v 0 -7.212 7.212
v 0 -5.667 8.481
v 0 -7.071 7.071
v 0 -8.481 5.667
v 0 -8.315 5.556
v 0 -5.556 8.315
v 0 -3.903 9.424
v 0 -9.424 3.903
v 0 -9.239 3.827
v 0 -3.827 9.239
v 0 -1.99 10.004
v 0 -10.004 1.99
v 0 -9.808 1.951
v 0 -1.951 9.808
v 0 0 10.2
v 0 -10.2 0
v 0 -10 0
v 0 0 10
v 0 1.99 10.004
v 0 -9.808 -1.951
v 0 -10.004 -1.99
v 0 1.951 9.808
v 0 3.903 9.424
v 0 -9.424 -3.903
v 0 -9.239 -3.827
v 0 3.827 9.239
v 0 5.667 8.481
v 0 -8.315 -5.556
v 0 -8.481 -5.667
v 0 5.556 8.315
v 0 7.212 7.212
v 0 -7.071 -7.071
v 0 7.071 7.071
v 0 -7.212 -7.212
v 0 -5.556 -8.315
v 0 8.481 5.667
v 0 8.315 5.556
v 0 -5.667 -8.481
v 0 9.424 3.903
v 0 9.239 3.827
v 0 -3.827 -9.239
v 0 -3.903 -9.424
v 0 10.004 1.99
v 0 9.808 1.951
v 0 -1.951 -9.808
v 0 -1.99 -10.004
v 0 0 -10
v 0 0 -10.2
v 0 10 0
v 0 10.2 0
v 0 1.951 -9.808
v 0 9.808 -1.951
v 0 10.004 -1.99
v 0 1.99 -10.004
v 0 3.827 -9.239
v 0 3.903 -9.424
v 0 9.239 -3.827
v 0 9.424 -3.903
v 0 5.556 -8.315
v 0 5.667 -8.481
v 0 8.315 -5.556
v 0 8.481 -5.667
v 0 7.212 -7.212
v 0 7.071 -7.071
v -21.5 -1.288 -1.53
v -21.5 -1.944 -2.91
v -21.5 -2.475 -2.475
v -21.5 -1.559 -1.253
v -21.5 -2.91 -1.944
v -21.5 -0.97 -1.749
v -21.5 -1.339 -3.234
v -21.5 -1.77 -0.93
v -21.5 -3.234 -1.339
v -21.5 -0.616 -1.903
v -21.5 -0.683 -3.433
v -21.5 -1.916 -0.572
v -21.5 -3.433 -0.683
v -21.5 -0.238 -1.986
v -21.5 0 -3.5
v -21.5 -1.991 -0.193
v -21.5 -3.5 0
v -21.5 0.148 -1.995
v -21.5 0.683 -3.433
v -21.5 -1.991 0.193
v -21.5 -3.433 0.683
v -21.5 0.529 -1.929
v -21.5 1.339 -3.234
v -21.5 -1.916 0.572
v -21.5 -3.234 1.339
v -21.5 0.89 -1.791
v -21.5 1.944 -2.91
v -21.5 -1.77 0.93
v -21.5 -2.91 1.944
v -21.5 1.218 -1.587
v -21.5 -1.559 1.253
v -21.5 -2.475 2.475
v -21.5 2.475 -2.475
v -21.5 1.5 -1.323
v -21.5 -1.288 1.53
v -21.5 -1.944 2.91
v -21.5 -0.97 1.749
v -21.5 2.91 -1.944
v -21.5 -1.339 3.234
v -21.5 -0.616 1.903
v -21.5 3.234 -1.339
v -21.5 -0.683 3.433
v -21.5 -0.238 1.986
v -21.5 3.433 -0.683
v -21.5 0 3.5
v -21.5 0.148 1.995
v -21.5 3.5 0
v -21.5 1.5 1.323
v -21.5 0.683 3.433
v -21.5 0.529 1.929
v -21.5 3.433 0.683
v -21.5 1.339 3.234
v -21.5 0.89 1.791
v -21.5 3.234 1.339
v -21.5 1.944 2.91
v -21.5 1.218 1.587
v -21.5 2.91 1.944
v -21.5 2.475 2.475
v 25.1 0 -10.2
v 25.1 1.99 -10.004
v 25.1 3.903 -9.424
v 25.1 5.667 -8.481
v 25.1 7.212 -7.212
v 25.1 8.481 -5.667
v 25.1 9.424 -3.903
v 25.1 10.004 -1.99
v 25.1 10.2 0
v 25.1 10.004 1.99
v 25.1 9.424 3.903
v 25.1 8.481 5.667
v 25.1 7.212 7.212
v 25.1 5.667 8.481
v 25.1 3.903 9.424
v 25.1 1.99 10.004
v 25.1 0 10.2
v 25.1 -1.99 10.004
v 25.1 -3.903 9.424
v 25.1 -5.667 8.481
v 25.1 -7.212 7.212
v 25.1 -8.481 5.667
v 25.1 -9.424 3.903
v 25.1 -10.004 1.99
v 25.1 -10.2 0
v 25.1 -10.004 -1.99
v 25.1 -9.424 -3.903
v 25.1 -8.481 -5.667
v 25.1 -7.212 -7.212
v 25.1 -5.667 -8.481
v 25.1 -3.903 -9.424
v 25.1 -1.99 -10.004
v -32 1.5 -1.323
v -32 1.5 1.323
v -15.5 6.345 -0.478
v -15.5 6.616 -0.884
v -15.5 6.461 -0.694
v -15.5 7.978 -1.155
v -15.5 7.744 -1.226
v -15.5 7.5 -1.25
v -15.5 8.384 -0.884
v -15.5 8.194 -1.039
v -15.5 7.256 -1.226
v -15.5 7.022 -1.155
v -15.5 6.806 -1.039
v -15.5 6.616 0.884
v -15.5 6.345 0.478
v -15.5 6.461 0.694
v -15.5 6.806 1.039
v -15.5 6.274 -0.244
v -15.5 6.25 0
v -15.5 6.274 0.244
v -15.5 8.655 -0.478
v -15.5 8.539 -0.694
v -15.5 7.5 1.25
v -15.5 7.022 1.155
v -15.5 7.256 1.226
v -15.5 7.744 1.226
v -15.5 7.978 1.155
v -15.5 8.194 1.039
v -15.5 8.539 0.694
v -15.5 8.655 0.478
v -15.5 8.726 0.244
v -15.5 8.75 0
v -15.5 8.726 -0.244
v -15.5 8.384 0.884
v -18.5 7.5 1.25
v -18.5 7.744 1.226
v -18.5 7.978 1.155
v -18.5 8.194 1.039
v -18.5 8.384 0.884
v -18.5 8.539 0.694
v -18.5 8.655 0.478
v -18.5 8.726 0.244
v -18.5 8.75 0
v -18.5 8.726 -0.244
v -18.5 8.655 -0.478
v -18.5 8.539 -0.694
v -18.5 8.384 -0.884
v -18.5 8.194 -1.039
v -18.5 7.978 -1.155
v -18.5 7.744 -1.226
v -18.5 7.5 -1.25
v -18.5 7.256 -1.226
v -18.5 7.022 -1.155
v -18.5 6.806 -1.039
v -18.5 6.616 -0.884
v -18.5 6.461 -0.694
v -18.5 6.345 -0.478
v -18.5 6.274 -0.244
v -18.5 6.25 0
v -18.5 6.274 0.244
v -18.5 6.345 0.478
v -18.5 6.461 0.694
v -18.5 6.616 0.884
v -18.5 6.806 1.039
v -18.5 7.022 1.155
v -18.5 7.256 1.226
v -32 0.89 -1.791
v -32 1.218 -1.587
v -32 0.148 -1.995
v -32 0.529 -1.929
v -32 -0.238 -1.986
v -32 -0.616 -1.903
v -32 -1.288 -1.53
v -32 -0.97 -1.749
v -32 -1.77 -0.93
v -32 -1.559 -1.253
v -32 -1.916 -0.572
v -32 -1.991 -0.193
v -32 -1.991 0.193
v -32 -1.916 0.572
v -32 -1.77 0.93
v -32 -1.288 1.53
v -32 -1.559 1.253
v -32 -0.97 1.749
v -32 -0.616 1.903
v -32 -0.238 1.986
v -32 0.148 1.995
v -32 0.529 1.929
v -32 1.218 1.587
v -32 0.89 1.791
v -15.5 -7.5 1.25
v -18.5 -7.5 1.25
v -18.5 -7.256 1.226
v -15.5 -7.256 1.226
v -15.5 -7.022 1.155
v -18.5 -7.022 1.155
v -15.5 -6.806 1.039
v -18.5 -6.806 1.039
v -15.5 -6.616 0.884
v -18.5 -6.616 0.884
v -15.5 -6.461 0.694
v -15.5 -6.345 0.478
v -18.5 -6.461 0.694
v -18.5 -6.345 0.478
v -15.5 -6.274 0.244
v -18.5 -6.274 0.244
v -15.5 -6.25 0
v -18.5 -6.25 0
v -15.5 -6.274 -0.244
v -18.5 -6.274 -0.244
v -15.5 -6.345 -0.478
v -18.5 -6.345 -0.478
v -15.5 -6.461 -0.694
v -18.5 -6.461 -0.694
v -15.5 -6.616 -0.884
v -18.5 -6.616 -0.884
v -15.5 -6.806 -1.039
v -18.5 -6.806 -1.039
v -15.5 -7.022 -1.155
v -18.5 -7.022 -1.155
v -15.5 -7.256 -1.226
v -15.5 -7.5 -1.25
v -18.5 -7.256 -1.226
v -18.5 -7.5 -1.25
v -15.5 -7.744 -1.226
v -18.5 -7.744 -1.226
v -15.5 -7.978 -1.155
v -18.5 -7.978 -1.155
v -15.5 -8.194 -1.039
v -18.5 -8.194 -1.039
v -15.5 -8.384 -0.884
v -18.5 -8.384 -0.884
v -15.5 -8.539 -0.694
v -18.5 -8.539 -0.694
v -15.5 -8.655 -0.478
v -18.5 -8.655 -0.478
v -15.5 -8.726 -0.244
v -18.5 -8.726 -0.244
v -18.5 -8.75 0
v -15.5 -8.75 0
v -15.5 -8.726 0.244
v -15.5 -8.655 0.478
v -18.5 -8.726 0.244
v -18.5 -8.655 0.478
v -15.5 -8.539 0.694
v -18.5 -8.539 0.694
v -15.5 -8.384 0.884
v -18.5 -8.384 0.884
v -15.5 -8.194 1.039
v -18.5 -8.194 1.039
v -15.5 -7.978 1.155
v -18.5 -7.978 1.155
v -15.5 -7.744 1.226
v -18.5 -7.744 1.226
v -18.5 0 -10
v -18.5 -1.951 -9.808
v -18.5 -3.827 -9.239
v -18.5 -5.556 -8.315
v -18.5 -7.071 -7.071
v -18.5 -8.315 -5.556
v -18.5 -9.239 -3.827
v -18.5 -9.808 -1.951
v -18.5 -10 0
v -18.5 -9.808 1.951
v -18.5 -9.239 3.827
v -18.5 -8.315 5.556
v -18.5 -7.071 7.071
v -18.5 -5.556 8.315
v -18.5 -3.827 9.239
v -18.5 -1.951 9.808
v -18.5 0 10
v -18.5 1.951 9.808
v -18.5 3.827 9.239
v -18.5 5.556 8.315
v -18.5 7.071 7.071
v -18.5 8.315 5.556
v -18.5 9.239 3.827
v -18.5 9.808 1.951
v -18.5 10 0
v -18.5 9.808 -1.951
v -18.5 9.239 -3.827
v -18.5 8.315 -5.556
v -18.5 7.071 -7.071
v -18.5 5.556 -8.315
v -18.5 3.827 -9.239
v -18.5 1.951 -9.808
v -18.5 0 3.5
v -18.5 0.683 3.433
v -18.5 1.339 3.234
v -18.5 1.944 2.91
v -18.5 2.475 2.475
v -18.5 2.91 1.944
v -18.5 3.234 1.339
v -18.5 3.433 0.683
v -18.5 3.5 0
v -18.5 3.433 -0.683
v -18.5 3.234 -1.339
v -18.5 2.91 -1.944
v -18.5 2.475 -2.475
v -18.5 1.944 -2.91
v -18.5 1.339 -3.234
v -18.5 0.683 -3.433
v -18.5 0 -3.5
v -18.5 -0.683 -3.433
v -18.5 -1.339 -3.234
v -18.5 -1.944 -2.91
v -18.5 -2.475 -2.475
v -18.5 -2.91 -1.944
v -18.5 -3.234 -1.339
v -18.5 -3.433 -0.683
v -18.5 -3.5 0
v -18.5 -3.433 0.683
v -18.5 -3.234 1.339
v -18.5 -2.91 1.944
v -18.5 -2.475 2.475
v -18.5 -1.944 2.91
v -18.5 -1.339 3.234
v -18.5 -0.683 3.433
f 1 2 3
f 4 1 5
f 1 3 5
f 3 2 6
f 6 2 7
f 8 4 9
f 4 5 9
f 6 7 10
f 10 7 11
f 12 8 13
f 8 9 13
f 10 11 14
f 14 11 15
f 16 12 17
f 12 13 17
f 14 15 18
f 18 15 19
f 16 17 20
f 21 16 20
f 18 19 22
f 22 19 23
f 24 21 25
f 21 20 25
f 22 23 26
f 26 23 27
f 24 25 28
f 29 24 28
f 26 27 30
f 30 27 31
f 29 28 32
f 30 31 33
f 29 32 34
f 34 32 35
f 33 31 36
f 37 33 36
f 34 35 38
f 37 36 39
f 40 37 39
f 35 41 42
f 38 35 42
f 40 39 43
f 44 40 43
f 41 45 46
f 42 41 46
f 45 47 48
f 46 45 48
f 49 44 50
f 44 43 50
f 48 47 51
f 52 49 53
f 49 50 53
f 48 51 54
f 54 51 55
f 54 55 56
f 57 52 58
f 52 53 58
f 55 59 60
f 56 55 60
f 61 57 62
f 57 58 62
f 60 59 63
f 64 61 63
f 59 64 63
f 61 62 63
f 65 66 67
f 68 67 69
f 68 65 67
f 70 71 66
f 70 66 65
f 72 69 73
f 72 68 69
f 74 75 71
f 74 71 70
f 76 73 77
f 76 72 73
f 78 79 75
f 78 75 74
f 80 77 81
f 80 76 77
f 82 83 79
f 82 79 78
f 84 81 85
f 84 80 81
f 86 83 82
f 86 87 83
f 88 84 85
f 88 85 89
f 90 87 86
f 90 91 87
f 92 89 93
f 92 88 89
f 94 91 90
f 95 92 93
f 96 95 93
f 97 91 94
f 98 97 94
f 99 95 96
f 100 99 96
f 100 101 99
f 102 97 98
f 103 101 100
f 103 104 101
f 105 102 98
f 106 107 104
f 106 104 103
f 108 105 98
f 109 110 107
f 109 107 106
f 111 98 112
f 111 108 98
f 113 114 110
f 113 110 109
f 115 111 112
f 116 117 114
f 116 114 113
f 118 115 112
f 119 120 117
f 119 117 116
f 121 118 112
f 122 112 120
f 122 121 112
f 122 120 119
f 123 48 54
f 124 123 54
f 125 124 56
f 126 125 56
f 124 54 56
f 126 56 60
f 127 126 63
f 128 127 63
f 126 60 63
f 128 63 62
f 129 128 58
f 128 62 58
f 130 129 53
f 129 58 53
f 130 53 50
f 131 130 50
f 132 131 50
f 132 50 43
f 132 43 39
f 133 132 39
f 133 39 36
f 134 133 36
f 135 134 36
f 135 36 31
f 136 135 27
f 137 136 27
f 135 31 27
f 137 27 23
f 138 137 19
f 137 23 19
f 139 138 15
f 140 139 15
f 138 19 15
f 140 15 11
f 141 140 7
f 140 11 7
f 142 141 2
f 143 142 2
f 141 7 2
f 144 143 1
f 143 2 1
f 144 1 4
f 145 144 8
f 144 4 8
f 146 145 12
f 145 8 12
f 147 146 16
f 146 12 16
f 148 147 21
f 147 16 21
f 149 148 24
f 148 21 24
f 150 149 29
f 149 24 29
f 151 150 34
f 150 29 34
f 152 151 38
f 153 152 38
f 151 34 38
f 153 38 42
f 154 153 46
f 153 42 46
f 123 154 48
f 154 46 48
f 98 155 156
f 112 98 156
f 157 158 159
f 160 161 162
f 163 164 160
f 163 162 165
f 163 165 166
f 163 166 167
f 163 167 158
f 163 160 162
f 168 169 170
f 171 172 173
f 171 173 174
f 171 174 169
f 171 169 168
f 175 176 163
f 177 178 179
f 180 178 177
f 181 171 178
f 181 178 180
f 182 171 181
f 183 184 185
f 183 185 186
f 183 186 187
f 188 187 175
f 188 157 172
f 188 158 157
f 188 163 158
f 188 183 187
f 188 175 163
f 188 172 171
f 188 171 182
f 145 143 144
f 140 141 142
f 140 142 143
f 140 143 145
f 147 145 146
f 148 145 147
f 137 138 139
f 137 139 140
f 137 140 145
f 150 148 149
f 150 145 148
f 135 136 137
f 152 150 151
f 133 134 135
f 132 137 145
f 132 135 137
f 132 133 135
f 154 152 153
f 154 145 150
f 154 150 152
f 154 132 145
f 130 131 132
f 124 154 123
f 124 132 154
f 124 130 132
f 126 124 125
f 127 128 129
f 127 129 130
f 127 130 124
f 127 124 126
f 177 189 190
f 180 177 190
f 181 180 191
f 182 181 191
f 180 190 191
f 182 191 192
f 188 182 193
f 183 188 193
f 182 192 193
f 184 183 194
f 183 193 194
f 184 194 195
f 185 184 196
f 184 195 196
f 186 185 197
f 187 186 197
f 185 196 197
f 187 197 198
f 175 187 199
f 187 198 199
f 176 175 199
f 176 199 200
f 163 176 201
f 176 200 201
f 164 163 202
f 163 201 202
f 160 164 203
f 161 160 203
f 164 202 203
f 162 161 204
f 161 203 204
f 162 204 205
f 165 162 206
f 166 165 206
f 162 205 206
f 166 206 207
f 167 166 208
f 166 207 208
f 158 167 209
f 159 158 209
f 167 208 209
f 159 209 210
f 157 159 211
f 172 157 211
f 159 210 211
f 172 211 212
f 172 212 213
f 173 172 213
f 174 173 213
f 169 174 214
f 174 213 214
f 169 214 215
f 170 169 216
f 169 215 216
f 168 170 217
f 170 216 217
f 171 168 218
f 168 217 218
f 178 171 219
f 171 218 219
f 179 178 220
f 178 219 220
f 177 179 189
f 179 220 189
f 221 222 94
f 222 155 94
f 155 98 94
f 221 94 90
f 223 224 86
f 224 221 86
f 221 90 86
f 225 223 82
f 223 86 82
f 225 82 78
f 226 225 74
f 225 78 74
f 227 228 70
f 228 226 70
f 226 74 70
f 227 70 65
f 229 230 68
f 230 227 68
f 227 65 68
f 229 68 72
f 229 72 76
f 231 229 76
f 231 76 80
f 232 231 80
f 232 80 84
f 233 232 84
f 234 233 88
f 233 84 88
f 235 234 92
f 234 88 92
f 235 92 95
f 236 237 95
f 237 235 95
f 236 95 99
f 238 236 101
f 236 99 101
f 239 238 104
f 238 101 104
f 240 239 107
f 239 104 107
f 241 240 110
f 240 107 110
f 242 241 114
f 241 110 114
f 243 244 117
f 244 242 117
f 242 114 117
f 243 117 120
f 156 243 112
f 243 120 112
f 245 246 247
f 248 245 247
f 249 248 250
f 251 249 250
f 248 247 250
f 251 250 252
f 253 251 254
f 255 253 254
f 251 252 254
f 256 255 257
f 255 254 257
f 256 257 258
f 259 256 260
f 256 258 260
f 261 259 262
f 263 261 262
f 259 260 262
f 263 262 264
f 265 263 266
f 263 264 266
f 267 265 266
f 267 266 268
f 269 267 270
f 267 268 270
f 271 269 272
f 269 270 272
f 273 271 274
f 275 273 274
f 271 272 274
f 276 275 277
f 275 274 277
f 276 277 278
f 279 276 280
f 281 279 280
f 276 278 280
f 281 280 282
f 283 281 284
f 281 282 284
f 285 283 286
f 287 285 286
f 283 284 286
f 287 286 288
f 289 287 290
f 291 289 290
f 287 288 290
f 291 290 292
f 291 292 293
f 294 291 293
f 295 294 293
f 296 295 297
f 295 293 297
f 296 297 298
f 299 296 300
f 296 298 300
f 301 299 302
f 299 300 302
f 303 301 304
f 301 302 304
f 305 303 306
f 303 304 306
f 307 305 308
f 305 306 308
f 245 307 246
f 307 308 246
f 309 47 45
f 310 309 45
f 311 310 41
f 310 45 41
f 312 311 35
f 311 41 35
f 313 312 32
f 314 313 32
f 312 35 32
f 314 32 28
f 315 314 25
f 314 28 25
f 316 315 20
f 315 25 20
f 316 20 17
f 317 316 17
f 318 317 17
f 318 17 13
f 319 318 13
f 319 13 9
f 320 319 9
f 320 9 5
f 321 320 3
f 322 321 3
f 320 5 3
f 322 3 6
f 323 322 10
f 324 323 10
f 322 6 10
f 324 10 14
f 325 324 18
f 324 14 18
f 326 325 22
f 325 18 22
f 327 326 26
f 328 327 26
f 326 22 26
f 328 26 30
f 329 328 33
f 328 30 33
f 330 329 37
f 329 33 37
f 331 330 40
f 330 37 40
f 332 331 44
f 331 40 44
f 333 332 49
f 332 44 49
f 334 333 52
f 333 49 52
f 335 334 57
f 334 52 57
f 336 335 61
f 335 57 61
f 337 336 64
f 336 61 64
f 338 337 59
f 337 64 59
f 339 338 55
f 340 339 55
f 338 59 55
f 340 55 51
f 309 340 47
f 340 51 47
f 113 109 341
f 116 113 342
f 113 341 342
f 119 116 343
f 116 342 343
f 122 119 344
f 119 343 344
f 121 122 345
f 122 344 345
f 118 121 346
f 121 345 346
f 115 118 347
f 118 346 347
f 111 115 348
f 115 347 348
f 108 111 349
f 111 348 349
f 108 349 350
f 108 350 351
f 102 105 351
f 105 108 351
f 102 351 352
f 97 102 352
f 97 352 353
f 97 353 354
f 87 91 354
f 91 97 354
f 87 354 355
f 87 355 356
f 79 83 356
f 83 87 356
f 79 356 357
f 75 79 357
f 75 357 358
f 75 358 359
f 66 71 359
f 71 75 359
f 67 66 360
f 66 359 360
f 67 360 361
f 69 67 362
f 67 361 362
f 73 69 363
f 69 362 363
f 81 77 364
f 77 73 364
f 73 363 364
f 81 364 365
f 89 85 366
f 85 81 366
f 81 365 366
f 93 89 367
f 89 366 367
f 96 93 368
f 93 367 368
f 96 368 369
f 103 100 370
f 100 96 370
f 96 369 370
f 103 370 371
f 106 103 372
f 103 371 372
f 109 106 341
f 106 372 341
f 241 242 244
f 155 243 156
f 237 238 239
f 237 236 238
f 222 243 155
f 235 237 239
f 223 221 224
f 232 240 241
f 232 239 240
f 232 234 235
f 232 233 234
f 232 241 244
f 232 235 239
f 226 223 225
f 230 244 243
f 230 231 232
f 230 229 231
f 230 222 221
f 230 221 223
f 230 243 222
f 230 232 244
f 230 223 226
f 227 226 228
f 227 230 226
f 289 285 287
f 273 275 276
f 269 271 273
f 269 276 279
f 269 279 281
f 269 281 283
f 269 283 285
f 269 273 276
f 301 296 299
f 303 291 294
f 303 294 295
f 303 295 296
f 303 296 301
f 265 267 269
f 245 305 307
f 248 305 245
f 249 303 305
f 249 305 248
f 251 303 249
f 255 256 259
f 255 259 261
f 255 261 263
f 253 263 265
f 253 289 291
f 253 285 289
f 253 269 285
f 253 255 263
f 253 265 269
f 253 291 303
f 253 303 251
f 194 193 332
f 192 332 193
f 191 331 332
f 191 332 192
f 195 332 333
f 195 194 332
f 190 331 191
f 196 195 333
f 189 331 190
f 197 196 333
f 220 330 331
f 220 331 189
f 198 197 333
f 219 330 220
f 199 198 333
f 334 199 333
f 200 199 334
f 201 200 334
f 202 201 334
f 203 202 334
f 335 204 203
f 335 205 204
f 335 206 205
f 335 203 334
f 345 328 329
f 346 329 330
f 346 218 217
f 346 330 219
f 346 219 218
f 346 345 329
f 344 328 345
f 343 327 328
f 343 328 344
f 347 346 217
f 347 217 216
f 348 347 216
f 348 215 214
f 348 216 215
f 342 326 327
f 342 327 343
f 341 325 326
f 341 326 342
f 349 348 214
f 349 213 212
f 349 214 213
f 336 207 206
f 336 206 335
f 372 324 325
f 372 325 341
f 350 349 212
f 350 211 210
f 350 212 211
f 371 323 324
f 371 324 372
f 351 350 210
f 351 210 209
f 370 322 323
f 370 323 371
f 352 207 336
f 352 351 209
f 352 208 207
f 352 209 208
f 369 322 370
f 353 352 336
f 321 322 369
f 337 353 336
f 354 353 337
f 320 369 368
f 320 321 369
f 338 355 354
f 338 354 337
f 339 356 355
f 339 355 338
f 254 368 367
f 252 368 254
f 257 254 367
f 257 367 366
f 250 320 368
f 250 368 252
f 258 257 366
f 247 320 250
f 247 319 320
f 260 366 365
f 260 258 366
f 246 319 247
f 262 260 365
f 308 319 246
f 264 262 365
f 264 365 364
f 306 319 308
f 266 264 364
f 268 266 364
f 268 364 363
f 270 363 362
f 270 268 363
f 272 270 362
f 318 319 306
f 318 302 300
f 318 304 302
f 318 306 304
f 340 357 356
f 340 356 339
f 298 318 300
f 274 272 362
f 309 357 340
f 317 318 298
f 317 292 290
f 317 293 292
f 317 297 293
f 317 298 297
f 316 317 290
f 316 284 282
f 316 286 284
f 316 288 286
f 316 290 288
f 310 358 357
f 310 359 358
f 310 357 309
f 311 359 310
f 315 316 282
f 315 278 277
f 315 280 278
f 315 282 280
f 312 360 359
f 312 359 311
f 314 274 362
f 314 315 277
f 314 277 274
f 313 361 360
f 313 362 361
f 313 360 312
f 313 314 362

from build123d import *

# Parameters (mm, degrees)
SKETCH1_R           = 10.2
BOSS_EXTRUDE1_DEPTH = 25.1
SKETCH2_R           = 10
BOSS_EXTRUDE2_DEPTH = 18.5
SKETCH3_R           = 3.5
BOSS_EXTRUDE3_DEPTH = 3
SKETCH4_R           = 2
BOSS_EXTRUDE4_DEPTH = 10.5
CUT_EXTRUDE1_DEPTH  = 10.5
SKETCH6_R           = 1.25
CUT_EXTRUDE2_DEPTH  = 3


with BuildPart() as part:
    # Sketch1 → Boss-Extrude1 (new body)
    with BuildSketch(Plane(origin=(0, 0, 0), x_dir=(0, 0, -1), z_dir=(1, 0, 0))):
        Circle(SKETCH1_R)
    extrude(amount=BOSS_EXTRUDE1_DEPTH)

    # Sketch2 → Boss-Extrude2 (add)
    with BuildSketch(Plane.ZY):
        with Locations(Location((0, 0, 0), (0, 0, 180))):
            Circle(SKETCH2_R)
    extrude(amount=BOSS_EXTRUDE2_DEPTH)

    # Sketch3 → Boss-Extrude3 (add)
    with BuildSketch(Plane.ZY.offset(18.5)):
        Circle(SKETCH3_R)
    extrude(amount=BOSS_EXTRUDE3_DEPTH)

    # Sketch4 → Boss-Extrude4 (add)
    with BuildSketch(Plane.ZY.offset(21.5)):
        with Locations(Location((0, 0, 0), (0, 0, 180))):
            Circle(SKETCH4_R)
    extrude(amount=BOSS_EXTRUDE4_DEPTH)

    # Sketch5 → Cut-Extrude1 (cut)
    with BuildSketch(Plane.ZY.offset(32)):
        Polygon((-44.16593662, 1.5), (-1.322875656, 1.5), (1.322875656, 1.5), (44.16593662, 1.5), (44.16593662, 87.186121928), (-44.16593662, 87.186121928), align=None)
    extrude(amount=-CUT_EXTRUDE1_DEPTH, mode=Mode.SUBTRACT)

    # Sketch6 → Cut-Extrude2 (cut)
    with BuildSketch(Plane.ZY.offset(18.5)):
        with Locations((0, 7.5)):
            Circle(SKETCH6_R)
        with Locations((0, -7.5)):
            Circle(SKETCH6_R)
    extrude(amount=-CUT_EXTRUDE2_DEPTH, mode=Mode.SUBTRACT)


solid = part.part
